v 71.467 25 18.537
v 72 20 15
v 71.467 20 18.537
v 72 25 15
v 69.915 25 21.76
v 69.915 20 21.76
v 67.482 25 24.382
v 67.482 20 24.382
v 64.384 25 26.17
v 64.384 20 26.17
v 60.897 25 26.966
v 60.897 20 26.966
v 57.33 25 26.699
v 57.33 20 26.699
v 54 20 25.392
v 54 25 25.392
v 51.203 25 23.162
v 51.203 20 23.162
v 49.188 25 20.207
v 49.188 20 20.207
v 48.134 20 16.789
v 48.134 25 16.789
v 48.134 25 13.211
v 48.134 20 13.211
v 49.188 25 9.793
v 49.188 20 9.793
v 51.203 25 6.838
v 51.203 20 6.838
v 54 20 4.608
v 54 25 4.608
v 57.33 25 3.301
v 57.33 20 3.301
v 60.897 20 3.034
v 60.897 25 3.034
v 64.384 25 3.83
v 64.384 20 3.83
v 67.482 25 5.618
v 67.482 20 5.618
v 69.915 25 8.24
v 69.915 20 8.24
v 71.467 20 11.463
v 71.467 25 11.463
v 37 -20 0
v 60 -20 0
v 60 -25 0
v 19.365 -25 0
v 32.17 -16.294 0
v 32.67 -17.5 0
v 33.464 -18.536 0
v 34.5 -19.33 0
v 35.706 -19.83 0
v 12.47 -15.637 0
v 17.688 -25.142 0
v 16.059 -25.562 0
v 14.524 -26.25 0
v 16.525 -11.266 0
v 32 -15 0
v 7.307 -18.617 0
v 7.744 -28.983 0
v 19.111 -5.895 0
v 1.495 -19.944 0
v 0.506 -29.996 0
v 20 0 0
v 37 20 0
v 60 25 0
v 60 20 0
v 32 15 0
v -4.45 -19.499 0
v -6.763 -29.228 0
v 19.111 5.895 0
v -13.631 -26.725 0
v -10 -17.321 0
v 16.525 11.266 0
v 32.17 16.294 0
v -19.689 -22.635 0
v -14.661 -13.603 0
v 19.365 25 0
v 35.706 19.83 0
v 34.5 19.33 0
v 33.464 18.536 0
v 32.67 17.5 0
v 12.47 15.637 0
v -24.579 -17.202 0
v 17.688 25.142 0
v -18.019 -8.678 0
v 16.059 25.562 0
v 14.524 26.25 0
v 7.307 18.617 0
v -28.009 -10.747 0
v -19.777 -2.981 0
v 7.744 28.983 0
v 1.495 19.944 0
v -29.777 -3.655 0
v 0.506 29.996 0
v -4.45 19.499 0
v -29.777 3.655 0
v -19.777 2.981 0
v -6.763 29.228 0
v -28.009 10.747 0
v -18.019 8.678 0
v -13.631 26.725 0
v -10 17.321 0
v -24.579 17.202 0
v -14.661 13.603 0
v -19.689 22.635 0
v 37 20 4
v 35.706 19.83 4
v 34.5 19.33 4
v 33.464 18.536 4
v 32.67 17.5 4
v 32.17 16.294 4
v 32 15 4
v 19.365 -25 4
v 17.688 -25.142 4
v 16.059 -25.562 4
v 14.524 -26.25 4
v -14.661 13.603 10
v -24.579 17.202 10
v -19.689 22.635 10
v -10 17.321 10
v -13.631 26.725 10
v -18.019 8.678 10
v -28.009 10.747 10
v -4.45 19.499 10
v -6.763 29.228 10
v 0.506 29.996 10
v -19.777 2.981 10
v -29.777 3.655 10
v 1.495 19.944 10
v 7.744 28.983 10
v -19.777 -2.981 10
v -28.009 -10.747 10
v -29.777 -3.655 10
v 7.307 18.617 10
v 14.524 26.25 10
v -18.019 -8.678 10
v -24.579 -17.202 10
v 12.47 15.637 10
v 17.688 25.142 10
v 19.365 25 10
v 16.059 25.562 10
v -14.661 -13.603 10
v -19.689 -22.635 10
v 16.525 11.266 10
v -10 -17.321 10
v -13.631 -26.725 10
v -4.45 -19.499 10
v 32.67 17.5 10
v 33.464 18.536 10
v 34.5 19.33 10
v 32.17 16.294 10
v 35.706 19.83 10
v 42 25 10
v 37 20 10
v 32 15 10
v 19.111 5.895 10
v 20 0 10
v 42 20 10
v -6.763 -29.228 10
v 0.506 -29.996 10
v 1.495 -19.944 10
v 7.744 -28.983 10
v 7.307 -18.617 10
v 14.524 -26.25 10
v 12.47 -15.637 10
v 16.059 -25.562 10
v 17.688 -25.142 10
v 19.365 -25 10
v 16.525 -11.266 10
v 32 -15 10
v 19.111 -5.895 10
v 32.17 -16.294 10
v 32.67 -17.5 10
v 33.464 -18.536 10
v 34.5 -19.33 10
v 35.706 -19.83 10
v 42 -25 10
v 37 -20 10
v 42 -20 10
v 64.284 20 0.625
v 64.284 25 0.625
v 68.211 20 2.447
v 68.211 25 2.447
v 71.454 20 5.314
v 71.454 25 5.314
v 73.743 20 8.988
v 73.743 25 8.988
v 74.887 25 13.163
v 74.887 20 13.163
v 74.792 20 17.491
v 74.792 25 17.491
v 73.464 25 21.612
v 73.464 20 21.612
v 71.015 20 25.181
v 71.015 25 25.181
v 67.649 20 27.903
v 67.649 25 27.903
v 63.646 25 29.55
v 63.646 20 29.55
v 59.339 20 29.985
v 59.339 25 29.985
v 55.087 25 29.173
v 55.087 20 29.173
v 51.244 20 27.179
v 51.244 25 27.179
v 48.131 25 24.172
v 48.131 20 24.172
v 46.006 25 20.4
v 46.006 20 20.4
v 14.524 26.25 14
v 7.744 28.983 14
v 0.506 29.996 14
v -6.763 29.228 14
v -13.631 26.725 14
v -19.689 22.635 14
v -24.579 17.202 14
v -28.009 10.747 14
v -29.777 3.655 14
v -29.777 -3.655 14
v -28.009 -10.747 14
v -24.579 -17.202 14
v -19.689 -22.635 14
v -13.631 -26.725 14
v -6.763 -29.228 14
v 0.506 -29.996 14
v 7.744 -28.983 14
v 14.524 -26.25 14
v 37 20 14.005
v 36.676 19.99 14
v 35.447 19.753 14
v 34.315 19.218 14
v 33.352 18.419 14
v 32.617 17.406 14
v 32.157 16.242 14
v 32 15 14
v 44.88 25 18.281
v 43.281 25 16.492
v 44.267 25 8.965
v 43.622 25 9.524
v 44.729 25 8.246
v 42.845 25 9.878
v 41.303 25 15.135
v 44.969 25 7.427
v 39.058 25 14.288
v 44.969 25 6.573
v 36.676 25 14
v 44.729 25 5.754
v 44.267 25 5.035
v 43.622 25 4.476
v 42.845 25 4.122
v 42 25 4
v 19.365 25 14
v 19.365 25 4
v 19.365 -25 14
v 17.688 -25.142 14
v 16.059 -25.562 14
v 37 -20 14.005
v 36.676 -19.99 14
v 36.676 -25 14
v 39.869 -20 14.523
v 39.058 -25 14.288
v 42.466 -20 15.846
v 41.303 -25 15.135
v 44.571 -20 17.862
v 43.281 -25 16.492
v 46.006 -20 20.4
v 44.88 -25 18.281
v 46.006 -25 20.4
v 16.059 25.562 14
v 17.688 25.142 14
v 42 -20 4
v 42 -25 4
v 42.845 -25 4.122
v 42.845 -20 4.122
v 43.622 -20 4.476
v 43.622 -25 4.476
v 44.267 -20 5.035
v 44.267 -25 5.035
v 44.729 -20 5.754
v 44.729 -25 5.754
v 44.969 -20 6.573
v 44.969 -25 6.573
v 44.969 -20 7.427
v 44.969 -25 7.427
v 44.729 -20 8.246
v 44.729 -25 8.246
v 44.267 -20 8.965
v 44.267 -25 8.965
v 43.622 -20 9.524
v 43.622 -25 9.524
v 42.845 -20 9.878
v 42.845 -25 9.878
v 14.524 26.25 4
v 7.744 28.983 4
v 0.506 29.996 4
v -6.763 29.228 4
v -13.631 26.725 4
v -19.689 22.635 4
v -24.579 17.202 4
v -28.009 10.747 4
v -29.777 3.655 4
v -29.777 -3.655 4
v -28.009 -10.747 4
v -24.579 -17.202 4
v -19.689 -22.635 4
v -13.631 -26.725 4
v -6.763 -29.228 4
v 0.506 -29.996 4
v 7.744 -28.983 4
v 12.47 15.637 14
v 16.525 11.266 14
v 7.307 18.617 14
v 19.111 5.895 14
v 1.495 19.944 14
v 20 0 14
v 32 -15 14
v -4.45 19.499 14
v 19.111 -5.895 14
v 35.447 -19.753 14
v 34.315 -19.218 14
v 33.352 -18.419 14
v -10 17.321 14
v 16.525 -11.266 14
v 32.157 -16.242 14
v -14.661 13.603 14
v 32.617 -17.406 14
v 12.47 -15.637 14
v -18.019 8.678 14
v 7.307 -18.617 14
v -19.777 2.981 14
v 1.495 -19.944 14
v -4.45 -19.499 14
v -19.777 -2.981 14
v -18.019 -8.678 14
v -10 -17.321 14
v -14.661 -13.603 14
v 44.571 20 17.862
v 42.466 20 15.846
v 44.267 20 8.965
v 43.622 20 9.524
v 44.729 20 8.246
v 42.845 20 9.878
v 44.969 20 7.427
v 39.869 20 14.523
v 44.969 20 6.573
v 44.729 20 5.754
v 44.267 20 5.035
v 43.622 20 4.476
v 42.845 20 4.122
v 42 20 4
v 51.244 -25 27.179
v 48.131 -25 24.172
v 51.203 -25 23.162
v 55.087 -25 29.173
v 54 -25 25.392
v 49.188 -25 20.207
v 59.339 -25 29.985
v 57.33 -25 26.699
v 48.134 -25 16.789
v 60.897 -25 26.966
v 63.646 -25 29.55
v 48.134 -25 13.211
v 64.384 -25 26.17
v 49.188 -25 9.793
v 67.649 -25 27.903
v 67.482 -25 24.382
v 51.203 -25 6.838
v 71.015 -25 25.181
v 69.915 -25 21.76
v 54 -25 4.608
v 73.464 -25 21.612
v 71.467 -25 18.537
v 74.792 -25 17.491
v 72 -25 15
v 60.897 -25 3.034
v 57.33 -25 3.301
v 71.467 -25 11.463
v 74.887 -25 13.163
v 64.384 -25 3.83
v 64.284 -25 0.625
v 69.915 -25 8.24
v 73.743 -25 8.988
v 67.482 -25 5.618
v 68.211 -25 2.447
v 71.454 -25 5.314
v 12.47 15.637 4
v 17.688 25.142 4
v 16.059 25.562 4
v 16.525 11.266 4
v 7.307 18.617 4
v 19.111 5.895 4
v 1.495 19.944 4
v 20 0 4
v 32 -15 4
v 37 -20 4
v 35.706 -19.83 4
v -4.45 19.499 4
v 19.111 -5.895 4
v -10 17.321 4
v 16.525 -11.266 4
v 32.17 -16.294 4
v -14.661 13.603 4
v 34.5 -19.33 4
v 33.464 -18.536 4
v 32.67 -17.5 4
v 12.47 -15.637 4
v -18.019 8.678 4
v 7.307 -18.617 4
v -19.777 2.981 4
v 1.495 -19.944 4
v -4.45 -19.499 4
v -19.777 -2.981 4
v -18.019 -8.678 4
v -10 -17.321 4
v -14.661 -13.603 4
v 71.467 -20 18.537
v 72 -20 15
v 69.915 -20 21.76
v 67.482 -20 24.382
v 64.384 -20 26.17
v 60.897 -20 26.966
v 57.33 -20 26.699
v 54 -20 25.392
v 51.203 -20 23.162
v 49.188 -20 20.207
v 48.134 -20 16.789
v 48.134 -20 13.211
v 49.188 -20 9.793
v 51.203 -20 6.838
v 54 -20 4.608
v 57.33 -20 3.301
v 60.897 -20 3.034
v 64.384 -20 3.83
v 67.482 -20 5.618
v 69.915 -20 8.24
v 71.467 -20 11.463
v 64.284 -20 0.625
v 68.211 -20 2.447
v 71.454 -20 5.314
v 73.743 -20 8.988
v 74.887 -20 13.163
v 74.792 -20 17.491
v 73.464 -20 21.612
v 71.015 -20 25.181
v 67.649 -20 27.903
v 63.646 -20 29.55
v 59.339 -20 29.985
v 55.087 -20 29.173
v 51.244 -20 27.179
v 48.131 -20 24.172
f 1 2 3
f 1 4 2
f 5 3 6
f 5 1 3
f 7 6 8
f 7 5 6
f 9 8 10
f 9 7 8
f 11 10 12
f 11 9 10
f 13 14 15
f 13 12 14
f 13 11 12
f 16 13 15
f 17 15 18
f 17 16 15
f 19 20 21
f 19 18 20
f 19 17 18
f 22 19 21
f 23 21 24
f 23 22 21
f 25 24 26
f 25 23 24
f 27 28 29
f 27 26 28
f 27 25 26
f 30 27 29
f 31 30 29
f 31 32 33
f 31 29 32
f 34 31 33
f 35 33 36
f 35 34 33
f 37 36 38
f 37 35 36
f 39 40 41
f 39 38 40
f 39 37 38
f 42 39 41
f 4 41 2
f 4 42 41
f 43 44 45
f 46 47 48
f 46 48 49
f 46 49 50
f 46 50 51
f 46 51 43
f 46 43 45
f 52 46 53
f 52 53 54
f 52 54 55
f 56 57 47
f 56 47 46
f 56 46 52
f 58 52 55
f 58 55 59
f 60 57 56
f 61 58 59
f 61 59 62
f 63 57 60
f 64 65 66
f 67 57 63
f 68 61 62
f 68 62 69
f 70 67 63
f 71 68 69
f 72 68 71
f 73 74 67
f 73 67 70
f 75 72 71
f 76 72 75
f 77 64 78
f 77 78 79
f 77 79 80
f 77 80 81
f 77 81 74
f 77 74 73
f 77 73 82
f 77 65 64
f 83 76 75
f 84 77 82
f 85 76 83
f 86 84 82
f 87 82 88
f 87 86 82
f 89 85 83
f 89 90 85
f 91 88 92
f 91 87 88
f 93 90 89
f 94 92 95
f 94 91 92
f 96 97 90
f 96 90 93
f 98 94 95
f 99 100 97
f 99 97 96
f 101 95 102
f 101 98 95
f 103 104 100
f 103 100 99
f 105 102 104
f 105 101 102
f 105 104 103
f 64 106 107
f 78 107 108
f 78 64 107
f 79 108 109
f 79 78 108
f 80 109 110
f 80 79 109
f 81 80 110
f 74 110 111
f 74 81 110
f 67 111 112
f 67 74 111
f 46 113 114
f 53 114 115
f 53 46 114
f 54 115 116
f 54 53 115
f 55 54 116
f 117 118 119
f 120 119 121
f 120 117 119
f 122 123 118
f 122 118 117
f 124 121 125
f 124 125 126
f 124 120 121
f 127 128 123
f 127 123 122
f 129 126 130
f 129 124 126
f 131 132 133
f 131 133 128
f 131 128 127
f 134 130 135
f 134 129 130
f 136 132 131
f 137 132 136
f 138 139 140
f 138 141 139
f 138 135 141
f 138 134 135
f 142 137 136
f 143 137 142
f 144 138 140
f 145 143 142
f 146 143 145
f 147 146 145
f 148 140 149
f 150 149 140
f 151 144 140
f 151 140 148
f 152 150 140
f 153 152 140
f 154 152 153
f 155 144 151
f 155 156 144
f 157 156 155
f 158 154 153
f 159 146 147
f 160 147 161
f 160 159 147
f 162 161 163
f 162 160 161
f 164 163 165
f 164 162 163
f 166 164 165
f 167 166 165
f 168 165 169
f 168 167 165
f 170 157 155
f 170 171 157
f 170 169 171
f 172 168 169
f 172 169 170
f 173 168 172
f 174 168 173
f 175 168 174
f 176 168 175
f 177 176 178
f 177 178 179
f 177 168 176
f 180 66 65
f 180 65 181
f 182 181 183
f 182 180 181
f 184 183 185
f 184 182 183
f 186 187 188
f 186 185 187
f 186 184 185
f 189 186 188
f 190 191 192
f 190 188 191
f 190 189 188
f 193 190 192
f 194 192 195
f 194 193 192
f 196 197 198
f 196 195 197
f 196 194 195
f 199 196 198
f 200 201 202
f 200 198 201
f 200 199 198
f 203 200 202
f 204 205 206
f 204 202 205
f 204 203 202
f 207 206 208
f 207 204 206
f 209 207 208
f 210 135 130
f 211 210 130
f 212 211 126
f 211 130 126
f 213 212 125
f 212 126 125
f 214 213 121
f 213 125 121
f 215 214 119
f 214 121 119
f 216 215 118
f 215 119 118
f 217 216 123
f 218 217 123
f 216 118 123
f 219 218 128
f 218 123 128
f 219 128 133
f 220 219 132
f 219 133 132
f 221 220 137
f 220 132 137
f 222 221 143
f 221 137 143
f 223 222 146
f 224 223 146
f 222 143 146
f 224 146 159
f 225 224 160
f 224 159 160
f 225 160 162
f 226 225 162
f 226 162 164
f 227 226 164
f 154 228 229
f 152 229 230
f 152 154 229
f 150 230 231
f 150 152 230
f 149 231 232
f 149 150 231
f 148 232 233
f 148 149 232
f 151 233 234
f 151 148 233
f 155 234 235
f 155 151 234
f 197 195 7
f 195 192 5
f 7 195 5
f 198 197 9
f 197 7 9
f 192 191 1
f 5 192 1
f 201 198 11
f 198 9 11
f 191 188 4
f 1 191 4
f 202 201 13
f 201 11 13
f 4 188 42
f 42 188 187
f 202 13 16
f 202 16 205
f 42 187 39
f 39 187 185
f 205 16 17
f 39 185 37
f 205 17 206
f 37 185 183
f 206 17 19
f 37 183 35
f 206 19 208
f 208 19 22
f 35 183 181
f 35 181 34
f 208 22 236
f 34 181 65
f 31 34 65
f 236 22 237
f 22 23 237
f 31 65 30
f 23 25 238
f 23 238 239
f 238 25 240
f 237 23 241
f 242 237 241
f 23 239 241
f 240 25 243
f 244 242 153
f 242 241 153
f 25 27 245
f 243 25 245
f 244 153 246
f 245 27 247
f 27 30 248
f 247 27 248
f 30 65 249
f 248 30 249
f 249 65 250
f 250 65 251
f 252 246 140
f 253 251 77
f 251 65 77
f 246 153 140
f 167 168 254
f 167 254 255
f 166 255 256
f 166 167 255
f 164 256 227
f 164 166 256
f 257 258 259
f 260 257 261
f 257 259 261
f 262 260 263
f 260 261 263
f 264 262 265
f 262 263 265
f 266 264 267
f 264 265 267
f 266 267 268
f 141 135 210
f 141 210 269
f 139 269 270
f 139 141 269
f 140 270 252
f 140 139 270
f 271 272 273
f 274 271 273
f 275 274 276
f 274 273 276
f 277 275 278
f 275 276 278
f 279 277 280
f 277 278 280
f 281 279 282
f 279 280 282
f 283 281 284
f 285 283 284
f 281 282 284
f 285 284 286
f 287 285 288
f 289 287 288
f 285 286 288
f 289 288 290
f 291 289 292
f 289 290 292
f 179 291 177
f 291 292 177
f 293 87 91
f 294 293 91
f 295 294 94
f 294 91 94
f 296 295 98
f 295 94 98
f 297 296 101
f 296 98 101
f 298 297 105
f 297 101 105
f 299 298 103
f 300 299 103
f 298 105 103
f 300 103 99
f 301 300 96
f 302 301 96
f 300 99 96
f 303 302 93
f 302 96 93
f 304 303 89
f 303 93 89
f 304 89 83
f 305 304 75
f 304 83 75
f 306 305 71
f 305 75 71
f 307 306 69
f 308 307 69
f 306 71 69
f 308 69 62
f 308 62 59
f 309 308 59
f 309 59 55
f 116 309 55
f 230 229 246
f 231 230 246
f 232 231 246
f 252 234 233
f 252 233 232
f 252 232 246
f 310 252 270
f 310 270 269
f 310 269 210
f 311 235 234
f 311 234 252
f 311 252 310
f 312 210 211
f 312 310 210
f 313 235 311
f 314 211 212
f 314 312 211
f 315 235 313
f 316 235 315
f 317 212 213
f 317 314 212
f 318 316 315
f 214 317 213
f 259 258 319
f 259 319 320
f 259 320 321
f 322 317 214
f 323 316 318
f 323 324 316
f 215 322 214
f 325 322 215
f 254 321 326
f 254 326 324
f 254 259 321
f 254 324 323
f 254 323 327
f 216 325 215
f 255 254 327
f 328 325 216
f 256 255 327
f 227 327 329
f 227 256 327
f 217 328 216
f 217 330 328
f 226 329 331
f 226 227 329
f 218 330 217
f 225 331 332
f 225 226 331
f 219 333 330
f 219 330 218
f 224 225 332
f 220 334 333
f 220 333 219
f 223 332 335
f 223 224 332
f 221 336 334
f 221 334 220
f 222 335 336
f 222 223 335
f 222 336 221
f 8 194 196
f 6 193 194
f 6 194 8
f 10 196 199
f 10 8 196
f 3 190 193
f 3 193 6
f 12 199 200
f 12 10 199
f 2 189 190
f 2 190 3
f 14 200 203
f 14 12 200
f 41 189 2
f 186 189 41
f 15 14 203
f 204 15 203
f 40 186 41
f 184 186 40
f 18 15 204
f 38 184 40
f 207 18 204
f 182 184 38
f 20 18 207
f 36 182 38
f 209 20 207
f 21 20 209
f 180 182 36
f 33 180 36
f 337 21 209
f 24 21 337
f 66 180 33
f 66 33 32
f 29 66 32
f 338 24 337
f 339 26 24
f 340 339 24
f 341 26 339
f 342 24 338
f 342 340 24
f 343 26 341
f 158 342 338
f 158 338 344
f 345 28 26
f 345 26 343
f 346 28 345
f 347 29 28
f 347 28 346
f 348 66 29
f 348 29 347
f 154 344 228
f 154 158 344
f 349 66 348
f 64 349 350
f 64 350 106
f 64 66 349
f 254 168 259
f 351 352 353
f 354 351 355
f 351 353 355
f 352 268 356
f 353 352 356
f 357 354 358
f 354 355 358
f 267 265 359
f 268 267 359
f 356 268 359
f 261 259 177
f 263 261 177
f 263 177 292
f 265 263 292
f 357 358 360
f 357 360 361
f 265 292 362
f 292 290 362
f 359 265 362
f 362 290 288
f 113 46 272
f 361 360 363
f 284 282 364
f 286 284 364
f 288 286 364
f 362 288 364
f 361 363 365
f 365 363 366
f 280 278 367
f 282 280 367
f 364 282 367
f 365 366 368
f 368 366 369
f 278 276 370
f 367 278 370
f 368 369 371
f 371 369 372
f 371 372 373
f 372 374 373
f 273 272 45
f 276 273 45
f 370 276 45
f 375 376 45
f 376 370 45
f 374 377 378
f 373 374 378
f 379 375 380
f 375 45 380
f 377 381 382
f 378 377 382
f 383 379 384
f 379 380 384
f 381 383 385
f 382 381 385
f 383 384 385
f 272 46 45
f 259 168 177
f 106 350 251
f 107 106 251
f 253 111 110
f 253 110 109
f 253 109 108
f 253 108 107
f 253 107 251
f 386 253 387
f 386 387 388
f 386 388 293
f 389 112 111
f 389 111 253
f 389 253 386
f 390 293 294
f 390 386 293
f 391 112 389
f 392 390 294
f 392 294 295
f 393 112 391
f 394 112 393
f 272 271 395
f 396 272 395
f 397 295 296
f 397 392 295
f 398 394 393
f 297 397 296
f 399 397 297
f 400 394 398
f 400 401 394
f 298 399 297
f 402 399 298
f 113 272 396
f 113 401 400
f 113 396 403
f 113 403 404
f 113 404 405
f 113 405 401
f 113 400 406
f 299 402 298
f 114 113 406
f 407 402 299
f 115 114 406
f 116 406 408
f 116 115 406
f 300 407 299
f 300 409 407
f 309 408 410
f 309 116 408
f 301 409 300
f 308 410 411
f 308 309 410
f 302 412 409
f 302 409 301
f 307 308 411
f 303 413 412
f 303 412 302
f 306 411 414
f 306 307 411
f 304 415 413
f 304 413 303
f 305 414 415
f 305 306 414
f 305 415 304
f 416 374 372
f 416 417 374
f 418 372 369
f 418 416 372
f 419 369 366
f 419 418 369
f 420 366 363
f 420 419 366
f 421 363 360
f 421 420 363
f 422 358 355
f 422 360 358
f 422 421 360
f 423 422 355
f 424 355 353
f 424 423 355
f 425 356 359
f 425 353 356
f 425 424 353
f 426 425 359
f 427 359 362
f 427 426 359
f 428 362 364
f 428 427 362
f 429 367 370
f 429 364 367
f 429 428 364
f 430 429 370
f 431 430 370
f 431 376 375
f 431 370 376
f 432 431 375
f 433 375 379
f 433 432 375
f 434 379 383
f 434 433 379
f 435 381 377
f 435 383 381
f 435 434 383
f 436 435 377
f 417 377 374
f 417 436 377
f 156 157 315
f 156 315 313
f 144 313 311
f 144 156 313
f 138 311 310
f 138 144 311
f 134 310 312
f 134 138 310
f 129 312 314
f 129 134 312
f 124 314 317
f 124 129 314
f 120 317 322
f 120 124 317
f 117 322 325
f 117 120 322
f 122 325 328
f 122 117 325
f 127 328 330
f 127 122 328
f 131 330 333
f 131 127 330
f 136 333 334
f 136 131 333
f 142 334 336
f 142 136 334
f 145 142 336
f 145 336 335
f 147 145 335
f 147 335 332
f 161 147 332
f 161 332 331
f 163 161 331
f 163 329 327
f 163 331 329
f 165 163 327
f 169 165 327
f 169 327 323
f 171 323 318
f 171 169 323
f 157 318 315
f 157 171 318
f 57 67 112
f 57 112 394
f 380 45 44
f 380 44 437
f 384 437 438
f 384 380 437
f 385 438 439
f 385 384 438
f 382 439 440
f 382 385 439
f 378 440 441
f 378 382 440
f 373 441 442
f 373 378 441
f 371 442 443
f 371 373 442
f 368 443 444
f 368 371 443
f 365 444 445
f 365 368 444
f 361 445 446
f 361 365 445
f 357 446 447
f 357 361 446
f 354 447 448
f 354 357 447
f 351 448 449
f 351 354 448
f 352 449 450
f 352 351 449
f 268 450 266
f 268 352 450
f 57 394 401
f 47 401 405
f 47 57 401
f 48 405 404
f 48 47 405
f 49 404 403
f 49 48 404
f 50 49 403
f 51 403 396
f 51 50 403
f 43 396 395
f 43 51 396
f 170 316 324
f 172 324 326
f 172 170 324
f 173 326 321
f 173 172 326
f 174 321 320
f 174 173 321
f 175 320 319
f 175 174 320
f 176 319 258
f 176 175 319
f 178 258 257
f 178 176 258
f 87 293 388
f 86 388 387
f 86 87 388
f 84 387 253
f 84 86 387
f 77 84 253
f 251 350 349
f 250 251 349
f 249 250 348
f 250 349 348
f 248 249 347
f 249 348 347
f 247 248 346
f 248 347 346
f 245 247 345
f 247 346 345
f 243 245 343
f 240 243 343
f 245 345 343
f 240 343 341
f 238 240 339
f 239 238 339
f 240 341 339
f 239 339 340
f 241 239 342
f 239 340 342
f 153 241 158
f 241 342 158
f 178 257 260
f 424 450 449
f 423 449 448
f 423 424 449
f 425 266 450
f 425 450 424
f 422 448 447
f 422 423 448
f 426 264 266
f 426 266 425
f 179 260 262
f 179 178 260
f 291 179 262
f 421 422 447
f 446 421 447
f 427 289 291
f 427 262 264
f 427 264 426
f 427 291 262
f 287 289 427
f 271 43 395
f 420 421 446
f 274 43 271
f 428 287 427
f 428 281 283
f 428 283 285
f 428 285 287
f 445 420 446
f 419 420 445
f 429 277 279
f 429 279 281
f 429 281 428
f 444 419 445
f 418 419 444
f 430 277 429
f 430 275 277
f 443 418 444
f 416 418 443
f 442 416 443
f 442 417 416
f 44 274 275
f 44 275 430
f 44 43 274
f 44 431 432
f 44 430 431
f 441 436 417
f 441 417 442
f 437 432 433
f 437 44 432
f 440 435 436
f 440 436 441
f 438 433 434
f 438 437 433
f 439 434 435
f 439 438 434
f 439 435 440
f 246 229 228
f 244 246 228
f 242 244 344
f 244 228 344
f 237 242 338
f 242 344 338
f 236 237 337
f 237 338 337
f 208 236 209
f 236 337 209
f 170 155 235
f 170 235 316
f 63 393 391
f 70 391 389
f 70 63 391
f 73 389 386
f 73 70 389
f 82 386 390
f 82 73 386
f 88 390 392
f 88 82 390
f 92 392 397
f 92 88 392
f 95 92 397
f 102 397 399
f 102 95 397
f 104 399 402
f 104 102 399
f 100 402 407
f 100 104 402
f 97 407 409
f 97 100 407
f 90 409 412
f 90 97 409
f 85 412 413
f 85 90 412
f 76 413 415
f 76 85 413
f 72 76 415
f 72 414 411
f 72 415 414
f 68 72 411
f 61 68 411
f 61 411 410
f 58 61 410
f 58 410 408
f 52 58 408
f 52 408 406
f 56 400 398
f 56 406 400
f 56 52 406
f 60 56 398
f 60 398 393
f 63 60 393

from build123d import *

# Parameters (mm, degrees)
SKETCH002_R  = 12
PAD001_DEPTH = 30
SKETCH_R     = 20
PAD_DEPTH    = 30


with BuildPart() as body_seitenansicht:
    # Sketch002 → Pad001 (new body, symmetric)
    with BuildSketch(Plane.XZ):
        with BuildLine():
            Line((-30, 14), (-30, 10))
            Line((-30, 10), (42, 10))
            ThreePointArc((42, 4), (45, 7), (42, 10))
            Line((42, 4), (-30, 4))
            Line((-30, 4), (-30, 0))
            Line((-30, 0), (60, 0))
            ThreePointArc((60, 0), (72.369317, 23.485281), (46.005715, 20.4))
            ThreePointArc((36.676192, 14), (42.333047, 15.753789), (46.005715, 20.4))
            Line((36.676192, 14), (-30, 14))
        make_face()
        with Locations((60, 15)):
            Circle(SKETCH002_R, mode=Mode.SUBTRACT)
    extrude(amount=PAD001_DEPTH, both=True)


with BuildPart() as body_draufsicht:
    # Sketch → Pad (new body)
    with BuildSketch(Plane.XY):
        with BuildLine():
            Line((75, 25), (75, 20))
            Line((75, 20), (37, 20))
            ThreePointArc((37, 20), (33.464466, 18.535534), (32, 15))
            Line((32, 15), (32, -15))
            ThreePointArc((32, -15), (33.464466, -18.535534), (37, -20))
            Line((37, -20), (75, -20))
            Line((75, -20), (75, -25))
            Line((19.364917, -25), (75, -25))
            ThreePointArc((19.364917, -25), (16.864917, -25.317542), (14.523688, -26.25))
            ThreePointArc((14.523688, 26.25), (-30, 0), (14.523688, -26.25))
            ThreePointArc((14.523688, 26.25), (16.864917, 25.317542), (19.364917, 25))
            Line((75, 25), (19.364917, 25))
        make_face()
        Circle(SKETCH_R, mode=Mode.SUBTRACT)
    extrude(amount=PAD_DEPTH)

    # Boolean: intersect body_seitenansicht
    add(body_seitenansicht.part, mode=Mode.INTERSECT)


solid = body_draufsicht.part
